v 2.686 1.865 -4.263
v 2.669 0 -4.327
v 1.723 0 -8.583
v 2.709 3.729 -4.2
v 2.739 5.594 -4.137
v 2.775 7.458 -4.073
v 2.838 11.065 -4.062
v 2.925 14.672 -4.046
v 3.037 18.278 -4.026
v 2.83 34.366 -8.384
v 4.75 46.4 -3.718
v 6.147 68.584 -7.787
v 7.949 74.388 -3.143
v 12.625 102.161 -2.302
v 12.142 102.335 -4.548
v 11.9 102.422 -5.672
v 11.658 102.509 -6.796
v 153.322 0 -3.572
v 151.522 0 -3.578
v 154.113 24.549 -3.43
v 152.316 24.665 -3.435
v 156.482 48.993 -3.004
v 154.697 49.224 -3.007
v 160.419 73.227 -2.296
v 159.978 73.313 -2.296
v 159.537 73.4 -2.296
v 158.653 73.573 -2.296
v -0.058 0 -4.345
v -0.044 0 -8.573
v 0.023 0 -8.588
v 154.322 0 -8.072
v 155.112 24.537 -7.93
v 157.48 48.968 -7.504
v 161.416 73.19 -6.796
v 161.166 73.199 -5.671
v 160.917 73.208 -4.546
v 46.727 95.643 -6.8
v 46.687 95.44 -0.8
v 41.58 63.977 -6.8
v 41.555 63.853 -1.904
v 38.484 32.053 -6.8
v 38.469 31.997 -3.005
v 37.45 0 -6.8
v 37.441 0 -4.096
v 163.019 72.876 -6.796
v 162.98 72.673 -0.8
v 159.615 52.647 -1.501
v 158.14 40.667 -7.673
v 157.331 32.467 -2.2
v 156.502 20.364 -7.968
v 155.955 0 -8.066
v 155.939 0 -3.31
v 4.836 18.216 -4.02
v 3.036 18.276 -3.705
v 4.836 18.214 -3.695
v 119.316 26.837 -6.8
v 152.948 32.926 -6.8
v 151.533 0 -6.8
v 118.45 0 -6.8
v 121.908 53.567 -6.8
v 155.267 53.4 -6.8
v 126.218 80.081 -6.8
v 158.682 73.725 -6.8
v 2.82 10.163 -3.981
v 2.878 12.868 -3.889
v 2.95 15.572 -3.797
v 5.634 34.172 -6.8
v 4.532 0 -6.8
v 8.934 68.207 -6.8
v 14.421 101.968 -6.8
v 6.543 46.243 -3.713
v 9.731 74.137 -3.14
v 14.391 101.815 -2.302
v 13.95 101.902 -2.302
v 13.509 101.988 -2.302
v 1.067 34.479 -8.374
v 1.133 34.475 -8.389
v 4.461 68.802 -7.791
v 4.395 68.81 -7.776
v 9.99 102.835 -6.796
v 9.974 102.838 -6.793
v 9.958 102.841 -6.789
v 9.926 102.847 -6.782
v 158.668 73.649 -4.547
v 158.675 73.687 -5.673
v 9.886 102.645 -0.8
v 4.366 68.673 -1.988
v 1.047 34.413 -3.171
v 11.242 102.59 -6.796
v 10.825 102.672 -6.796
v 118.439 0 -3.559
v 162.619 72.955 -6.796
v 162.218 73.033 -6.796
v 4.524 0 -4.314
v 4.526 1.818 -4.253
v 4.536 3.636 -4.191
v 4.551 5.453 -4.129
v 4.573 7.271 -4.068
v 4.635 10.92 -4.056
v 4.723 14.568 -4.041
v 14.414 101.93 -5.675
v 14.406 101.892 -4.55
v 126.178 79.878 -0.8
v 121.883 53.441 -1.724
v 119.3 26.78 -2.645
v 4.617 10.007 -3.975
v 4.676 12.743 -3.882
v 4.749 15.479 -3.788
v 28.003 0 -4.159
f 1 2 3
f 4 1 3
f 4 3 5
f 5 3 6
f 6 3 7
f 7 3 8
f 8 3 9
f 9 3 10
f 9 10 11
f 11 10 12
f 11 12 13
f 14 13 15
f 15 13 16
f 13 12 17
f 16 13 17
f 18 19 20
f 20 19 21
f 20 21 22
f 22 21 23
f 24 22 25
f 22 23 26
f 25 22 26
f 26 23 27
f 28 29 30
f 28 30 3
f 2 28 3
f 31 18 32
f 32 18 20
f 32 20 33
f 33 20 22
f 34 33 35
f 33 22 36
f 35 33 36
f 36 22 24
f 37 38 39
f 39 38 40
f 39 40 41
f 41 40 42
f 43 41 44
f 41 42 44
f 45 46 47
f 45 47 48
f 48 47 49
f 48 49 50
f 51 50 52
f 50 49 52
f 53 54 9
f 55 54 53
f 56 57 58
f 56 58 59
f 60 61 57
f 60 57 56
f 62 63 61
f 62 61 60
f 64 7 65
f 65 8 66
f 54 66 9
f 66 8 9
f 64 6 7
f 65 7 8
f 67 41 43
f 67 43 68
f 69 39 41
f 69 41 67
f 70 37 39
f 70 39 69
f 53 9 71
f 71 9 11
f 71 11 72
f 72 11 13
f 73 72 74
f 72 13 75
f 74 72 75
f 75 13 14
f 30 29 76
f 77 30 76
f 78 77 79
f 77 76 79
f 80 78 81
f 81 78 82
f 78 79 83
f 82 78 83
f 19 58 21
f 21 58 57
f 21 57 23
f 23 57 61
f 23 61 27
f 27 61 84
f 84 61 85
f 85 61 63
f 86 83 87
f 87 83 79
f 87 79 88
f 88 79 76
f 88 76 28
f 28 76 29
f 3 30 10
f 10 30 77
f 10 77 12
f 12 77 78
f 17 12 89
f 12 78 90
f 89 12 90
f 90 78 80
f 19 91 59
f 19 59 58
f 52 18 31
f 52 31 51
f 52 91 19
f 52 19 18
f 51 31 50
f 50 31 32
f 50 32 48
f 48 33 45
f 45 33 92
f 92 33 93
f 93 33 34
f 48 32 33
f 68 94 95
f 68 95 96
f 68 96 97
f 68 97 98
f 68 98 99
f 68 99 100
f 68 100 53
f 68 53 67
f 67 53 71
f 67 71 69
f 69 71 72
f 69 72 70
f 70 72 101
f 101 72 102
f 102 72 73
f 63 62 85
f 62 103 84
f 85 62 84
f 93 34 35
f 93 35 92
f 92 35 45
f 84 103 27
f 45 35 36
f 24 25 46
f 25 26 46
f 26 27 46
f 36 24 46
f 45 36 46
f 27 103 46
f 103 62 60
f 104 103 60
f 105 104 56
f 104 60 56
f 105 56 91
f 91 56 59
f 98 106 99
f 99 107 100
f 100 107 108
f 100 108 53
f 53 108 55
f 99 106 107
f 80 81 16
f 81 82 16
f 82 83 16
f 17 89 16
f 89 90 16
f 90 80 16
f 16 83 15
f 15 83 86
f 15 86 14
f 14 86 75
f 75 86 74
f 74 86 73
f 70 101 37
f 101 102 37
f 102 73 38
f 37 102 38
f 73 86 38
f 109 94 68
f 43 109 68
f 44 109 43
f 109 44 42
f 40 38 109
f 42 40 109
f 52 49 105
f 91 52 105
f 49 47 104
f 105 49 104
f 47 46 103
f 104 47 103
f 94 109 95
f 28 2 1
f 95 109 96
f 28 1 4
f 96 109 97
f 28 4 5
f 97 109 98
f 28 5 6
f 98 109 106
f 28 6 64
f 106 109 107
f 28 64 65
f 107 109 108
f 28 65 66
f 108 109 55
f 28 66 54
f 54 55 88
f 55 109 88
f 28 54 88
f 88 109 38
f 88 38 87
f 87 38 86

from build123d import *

# Parameters (mm, degrees)
F1_ANGLE_BACK = 11.25
F1_ANGLE      = 22.5
F2_W          = 148
F2_H          = 20.6737495929
F5_DEPTH      = 211.4
F7_DEPTH      = 234.2
F8_W          = 286.8234440684
F8_H          = 99.4558036327
F9_DEPTH      = 112
F11_ANGLE     = 30
F13_ANGLE     = 2


# Not quite as in the source:
# - a feature names something its author has since deleted; it is built from what else it names


with BuildPart() as f1:
    # F0 (on Front) → F1 (revolve)
    with BuildSketch(Plane.XZ, mode=Mode.PRIVATE) as f1_sk:
        Polygon((37.433034228, -1.662807624), (-0.066965772, -1.7883691504), (0, -21.7882570398), (37.5, -21.6626955134), align=None)
    revolve(f1_sk.sketch.rotate(Axis((525.8388087714, 0, 45.6422517605), (-0.1769446249, 0, 0.9842208084)), -F1_ANGLE_BACK), axis=Axis((525.8388087714, 0, 45.6422517605), (-0.1769446249, 0, 0.9842208084)), revolution_arc=F1_ANGLE)


with BuildPart() as f1b:
    # F0 (on Front) → F1, piece 2 (revolve)
    with BuildSketch(Plane.XZ, mode=Mode.PRIVATE) as f1_sk:
        Polygon((155.9321597647, -1.2660361285), (118.4321597647, -1.391597655), (118.4991255367, -21.3914855443), (155.9991255367, -21.2659240179), align=None)
    revolve(f1_sk.sketch.rotate(Axis((525.8388087714, 0, 45.6422517605), (-0.1769446249, 0, 0.9842208084)), -F1_ANGLE_BACK), axis=Axis((525.8388087714, 0, 45.6422517605), (-0.1769446249, 0, 0.9842208084)), revolution_arc=F1_ANGLE)


with BuildPart() as f3_tool:
    # F2 (on Front) → F3 (revolve)
    with BuildSketch(Plane.XZ):
        with Locations((78, -17.1368747965)):
            Rectangle(F2_W, F2_H)
    revolve(axis=Axis((526, 0, -40.4653474689), (0, 0, -1)))


with BuildPart() as f1_1:
    add(f1.part)

    # F3: cut by f3_tool
    add(f3_tool.part, mode=Mode.SUBTRACT)

    # F6 (on face) → F7 (cut)
    with BuildSketch(Plane(origin=(19.6894657776, 100.5725829361, 3.539800323), x_dir=(-0.9813925868, 0.1918931334, 0.0067539617), z_dir=(0.1920119545, 0.9807852804, 0.0345201838))):
        Polygon((9.9895421705, -4.4095212135), (35.8401375413, -4.5842232545), (37.4985628908, 20.4695294659), (-71.4865817421, 21.206066746), (-71.6559666141, -3.8577491241), (-27.5098117032, -4.1560951874), (-27.5044053117, -3.3561134558), (9.9949485621, -3.6095394819), align=None)
        Polygon((-27.5098117032, -4.1560951874), (9.9895421705, -4.4095212135), (9.9949485621, -3.6095394819), (-27.5044053117, -3.3561134558), align=None)
    extrude(amount=-F7_DEPTH, mode=Mode.SUBTRACT)


with BuildPart() as f1b_1:
    add(f1b.part)

    # F3: cut by f3_tool
    add(f3_tool.part, mode=Mode.SUBTRACT)

    # F4 (on face) → F5 (cut)
    with BuildSketch(Plane(origin=(19.6894657776, 100.5725829361, 3.539800323), x_dir=(-0.9813925868, 0.1918931334, 0.0067539617), z_dir=(0.1920119545, 0.9807852804, 0.0345201838))):
        Polygon((-108.5075416222, -3.6087008807), (-101.6713570142, -3.6549007994), (-102.5302484632, 6.0979337431), (-179.1422963142, 8.3114448935), (-179.1422963142, -3.1313410508), (-146.006895496, -3.3552748546), (-146.0014891044, -2.555293123), (-108.5021352307, -2.8087191491), align=None)
        Polygon((-146.006895496, -3.3552748546), (-108.5075416222, -3.6087008807), (-108.5021352307, -2.8087191491), (-146.0014891044, -2.555293123), align=None)
    extrude(amount=-F5_DEPTH, mode=Mode.SUBTRACT)


with BuildPart() as f9_tool:
    # F8 (on Front) → F9 (new body)
    with BuildSketch(Plane.XZ):
        with Locations((59.2738725245, -18.6479687691)):
            Rectangle(F8_W, F8_H)
    extrude(amount=F9_DEPTH)


with BuildPart() as f1_2:
    add(f1_1.part)

    # F9: cut by f9_tool
    add(f9_tool.part, mode=Mode.SUBTRACT)


with BuildPart() as f1b_2:
    add(f1b_1.part)

    # F9: cut by f9_tool
    add(f9_tool.part, mode=Mode.SUBTRACT)


with BuildPart() as f11_tool:
    # F10 (on Front) → F11 (revolve)
    with BuildSketch(Plane.XZ):
        Polygon((1.7227589607, -8.5826770598), (0.0227684901, -8.5883691504), (0.066965772, -21.7882570398), (4.5820021559, -21.7731393102), (4.5227488708, -4.0766501403), (2.7227589607, -4.0826770598), align=None)
        Polygon((156.0660913087, -21.2659240179), (156.0218940268, -8.0660361285), (154.3219035562, -8.0717282192), (153.3219035562, -3.5717282192), (151.5219136462, -3.5777551387), (151.5811893534, -21.2809408481), align=None)
        Polygon((0.066965772, -21.7882570398), (0.0227684901, -8.5883691504), (-1.582706409, -8.2315969506), (-1.532864623, -23.1172631943), align=None)
    revolve(axis=Axis((525.9057745435, 0, 45.6422517605), (0.1769446249, 0, -0.9842208084)), revolution_arc=F11_ANGLE)


with BuildPart() as f1_3:
    add(f1_2.part)

    # F11: cut by f11_tool
    add(f11_tool.part, mode=Mode.SUBTRACT)

    # F12 (on Front) → F13 (revolve, cut)
    with BuildSketch(Plane.XZ):
        Polygon((4.5227488708, -4.0766501403), (4.5227488708, -1.773225597), (2.7150464738, -1.7792783403), (2.7227589607, -4.0826770598), align=None)
    revolve(axis=Axis((525.9057745435, 0, 45.6422517605), (0.1769446249, 0, -0.9842208084)), revolution_arc=F13_ANGLE, mode=Mode.SUBTRACT)


with BuildPart() as f1b_3:
    add(f1b_2.part)

    # F11: cut by f11_tool
    add(f11_tool.part, mode=Mode.SUBTRACT)


solid = Compound([f1_3.part, f1b_3.part])
